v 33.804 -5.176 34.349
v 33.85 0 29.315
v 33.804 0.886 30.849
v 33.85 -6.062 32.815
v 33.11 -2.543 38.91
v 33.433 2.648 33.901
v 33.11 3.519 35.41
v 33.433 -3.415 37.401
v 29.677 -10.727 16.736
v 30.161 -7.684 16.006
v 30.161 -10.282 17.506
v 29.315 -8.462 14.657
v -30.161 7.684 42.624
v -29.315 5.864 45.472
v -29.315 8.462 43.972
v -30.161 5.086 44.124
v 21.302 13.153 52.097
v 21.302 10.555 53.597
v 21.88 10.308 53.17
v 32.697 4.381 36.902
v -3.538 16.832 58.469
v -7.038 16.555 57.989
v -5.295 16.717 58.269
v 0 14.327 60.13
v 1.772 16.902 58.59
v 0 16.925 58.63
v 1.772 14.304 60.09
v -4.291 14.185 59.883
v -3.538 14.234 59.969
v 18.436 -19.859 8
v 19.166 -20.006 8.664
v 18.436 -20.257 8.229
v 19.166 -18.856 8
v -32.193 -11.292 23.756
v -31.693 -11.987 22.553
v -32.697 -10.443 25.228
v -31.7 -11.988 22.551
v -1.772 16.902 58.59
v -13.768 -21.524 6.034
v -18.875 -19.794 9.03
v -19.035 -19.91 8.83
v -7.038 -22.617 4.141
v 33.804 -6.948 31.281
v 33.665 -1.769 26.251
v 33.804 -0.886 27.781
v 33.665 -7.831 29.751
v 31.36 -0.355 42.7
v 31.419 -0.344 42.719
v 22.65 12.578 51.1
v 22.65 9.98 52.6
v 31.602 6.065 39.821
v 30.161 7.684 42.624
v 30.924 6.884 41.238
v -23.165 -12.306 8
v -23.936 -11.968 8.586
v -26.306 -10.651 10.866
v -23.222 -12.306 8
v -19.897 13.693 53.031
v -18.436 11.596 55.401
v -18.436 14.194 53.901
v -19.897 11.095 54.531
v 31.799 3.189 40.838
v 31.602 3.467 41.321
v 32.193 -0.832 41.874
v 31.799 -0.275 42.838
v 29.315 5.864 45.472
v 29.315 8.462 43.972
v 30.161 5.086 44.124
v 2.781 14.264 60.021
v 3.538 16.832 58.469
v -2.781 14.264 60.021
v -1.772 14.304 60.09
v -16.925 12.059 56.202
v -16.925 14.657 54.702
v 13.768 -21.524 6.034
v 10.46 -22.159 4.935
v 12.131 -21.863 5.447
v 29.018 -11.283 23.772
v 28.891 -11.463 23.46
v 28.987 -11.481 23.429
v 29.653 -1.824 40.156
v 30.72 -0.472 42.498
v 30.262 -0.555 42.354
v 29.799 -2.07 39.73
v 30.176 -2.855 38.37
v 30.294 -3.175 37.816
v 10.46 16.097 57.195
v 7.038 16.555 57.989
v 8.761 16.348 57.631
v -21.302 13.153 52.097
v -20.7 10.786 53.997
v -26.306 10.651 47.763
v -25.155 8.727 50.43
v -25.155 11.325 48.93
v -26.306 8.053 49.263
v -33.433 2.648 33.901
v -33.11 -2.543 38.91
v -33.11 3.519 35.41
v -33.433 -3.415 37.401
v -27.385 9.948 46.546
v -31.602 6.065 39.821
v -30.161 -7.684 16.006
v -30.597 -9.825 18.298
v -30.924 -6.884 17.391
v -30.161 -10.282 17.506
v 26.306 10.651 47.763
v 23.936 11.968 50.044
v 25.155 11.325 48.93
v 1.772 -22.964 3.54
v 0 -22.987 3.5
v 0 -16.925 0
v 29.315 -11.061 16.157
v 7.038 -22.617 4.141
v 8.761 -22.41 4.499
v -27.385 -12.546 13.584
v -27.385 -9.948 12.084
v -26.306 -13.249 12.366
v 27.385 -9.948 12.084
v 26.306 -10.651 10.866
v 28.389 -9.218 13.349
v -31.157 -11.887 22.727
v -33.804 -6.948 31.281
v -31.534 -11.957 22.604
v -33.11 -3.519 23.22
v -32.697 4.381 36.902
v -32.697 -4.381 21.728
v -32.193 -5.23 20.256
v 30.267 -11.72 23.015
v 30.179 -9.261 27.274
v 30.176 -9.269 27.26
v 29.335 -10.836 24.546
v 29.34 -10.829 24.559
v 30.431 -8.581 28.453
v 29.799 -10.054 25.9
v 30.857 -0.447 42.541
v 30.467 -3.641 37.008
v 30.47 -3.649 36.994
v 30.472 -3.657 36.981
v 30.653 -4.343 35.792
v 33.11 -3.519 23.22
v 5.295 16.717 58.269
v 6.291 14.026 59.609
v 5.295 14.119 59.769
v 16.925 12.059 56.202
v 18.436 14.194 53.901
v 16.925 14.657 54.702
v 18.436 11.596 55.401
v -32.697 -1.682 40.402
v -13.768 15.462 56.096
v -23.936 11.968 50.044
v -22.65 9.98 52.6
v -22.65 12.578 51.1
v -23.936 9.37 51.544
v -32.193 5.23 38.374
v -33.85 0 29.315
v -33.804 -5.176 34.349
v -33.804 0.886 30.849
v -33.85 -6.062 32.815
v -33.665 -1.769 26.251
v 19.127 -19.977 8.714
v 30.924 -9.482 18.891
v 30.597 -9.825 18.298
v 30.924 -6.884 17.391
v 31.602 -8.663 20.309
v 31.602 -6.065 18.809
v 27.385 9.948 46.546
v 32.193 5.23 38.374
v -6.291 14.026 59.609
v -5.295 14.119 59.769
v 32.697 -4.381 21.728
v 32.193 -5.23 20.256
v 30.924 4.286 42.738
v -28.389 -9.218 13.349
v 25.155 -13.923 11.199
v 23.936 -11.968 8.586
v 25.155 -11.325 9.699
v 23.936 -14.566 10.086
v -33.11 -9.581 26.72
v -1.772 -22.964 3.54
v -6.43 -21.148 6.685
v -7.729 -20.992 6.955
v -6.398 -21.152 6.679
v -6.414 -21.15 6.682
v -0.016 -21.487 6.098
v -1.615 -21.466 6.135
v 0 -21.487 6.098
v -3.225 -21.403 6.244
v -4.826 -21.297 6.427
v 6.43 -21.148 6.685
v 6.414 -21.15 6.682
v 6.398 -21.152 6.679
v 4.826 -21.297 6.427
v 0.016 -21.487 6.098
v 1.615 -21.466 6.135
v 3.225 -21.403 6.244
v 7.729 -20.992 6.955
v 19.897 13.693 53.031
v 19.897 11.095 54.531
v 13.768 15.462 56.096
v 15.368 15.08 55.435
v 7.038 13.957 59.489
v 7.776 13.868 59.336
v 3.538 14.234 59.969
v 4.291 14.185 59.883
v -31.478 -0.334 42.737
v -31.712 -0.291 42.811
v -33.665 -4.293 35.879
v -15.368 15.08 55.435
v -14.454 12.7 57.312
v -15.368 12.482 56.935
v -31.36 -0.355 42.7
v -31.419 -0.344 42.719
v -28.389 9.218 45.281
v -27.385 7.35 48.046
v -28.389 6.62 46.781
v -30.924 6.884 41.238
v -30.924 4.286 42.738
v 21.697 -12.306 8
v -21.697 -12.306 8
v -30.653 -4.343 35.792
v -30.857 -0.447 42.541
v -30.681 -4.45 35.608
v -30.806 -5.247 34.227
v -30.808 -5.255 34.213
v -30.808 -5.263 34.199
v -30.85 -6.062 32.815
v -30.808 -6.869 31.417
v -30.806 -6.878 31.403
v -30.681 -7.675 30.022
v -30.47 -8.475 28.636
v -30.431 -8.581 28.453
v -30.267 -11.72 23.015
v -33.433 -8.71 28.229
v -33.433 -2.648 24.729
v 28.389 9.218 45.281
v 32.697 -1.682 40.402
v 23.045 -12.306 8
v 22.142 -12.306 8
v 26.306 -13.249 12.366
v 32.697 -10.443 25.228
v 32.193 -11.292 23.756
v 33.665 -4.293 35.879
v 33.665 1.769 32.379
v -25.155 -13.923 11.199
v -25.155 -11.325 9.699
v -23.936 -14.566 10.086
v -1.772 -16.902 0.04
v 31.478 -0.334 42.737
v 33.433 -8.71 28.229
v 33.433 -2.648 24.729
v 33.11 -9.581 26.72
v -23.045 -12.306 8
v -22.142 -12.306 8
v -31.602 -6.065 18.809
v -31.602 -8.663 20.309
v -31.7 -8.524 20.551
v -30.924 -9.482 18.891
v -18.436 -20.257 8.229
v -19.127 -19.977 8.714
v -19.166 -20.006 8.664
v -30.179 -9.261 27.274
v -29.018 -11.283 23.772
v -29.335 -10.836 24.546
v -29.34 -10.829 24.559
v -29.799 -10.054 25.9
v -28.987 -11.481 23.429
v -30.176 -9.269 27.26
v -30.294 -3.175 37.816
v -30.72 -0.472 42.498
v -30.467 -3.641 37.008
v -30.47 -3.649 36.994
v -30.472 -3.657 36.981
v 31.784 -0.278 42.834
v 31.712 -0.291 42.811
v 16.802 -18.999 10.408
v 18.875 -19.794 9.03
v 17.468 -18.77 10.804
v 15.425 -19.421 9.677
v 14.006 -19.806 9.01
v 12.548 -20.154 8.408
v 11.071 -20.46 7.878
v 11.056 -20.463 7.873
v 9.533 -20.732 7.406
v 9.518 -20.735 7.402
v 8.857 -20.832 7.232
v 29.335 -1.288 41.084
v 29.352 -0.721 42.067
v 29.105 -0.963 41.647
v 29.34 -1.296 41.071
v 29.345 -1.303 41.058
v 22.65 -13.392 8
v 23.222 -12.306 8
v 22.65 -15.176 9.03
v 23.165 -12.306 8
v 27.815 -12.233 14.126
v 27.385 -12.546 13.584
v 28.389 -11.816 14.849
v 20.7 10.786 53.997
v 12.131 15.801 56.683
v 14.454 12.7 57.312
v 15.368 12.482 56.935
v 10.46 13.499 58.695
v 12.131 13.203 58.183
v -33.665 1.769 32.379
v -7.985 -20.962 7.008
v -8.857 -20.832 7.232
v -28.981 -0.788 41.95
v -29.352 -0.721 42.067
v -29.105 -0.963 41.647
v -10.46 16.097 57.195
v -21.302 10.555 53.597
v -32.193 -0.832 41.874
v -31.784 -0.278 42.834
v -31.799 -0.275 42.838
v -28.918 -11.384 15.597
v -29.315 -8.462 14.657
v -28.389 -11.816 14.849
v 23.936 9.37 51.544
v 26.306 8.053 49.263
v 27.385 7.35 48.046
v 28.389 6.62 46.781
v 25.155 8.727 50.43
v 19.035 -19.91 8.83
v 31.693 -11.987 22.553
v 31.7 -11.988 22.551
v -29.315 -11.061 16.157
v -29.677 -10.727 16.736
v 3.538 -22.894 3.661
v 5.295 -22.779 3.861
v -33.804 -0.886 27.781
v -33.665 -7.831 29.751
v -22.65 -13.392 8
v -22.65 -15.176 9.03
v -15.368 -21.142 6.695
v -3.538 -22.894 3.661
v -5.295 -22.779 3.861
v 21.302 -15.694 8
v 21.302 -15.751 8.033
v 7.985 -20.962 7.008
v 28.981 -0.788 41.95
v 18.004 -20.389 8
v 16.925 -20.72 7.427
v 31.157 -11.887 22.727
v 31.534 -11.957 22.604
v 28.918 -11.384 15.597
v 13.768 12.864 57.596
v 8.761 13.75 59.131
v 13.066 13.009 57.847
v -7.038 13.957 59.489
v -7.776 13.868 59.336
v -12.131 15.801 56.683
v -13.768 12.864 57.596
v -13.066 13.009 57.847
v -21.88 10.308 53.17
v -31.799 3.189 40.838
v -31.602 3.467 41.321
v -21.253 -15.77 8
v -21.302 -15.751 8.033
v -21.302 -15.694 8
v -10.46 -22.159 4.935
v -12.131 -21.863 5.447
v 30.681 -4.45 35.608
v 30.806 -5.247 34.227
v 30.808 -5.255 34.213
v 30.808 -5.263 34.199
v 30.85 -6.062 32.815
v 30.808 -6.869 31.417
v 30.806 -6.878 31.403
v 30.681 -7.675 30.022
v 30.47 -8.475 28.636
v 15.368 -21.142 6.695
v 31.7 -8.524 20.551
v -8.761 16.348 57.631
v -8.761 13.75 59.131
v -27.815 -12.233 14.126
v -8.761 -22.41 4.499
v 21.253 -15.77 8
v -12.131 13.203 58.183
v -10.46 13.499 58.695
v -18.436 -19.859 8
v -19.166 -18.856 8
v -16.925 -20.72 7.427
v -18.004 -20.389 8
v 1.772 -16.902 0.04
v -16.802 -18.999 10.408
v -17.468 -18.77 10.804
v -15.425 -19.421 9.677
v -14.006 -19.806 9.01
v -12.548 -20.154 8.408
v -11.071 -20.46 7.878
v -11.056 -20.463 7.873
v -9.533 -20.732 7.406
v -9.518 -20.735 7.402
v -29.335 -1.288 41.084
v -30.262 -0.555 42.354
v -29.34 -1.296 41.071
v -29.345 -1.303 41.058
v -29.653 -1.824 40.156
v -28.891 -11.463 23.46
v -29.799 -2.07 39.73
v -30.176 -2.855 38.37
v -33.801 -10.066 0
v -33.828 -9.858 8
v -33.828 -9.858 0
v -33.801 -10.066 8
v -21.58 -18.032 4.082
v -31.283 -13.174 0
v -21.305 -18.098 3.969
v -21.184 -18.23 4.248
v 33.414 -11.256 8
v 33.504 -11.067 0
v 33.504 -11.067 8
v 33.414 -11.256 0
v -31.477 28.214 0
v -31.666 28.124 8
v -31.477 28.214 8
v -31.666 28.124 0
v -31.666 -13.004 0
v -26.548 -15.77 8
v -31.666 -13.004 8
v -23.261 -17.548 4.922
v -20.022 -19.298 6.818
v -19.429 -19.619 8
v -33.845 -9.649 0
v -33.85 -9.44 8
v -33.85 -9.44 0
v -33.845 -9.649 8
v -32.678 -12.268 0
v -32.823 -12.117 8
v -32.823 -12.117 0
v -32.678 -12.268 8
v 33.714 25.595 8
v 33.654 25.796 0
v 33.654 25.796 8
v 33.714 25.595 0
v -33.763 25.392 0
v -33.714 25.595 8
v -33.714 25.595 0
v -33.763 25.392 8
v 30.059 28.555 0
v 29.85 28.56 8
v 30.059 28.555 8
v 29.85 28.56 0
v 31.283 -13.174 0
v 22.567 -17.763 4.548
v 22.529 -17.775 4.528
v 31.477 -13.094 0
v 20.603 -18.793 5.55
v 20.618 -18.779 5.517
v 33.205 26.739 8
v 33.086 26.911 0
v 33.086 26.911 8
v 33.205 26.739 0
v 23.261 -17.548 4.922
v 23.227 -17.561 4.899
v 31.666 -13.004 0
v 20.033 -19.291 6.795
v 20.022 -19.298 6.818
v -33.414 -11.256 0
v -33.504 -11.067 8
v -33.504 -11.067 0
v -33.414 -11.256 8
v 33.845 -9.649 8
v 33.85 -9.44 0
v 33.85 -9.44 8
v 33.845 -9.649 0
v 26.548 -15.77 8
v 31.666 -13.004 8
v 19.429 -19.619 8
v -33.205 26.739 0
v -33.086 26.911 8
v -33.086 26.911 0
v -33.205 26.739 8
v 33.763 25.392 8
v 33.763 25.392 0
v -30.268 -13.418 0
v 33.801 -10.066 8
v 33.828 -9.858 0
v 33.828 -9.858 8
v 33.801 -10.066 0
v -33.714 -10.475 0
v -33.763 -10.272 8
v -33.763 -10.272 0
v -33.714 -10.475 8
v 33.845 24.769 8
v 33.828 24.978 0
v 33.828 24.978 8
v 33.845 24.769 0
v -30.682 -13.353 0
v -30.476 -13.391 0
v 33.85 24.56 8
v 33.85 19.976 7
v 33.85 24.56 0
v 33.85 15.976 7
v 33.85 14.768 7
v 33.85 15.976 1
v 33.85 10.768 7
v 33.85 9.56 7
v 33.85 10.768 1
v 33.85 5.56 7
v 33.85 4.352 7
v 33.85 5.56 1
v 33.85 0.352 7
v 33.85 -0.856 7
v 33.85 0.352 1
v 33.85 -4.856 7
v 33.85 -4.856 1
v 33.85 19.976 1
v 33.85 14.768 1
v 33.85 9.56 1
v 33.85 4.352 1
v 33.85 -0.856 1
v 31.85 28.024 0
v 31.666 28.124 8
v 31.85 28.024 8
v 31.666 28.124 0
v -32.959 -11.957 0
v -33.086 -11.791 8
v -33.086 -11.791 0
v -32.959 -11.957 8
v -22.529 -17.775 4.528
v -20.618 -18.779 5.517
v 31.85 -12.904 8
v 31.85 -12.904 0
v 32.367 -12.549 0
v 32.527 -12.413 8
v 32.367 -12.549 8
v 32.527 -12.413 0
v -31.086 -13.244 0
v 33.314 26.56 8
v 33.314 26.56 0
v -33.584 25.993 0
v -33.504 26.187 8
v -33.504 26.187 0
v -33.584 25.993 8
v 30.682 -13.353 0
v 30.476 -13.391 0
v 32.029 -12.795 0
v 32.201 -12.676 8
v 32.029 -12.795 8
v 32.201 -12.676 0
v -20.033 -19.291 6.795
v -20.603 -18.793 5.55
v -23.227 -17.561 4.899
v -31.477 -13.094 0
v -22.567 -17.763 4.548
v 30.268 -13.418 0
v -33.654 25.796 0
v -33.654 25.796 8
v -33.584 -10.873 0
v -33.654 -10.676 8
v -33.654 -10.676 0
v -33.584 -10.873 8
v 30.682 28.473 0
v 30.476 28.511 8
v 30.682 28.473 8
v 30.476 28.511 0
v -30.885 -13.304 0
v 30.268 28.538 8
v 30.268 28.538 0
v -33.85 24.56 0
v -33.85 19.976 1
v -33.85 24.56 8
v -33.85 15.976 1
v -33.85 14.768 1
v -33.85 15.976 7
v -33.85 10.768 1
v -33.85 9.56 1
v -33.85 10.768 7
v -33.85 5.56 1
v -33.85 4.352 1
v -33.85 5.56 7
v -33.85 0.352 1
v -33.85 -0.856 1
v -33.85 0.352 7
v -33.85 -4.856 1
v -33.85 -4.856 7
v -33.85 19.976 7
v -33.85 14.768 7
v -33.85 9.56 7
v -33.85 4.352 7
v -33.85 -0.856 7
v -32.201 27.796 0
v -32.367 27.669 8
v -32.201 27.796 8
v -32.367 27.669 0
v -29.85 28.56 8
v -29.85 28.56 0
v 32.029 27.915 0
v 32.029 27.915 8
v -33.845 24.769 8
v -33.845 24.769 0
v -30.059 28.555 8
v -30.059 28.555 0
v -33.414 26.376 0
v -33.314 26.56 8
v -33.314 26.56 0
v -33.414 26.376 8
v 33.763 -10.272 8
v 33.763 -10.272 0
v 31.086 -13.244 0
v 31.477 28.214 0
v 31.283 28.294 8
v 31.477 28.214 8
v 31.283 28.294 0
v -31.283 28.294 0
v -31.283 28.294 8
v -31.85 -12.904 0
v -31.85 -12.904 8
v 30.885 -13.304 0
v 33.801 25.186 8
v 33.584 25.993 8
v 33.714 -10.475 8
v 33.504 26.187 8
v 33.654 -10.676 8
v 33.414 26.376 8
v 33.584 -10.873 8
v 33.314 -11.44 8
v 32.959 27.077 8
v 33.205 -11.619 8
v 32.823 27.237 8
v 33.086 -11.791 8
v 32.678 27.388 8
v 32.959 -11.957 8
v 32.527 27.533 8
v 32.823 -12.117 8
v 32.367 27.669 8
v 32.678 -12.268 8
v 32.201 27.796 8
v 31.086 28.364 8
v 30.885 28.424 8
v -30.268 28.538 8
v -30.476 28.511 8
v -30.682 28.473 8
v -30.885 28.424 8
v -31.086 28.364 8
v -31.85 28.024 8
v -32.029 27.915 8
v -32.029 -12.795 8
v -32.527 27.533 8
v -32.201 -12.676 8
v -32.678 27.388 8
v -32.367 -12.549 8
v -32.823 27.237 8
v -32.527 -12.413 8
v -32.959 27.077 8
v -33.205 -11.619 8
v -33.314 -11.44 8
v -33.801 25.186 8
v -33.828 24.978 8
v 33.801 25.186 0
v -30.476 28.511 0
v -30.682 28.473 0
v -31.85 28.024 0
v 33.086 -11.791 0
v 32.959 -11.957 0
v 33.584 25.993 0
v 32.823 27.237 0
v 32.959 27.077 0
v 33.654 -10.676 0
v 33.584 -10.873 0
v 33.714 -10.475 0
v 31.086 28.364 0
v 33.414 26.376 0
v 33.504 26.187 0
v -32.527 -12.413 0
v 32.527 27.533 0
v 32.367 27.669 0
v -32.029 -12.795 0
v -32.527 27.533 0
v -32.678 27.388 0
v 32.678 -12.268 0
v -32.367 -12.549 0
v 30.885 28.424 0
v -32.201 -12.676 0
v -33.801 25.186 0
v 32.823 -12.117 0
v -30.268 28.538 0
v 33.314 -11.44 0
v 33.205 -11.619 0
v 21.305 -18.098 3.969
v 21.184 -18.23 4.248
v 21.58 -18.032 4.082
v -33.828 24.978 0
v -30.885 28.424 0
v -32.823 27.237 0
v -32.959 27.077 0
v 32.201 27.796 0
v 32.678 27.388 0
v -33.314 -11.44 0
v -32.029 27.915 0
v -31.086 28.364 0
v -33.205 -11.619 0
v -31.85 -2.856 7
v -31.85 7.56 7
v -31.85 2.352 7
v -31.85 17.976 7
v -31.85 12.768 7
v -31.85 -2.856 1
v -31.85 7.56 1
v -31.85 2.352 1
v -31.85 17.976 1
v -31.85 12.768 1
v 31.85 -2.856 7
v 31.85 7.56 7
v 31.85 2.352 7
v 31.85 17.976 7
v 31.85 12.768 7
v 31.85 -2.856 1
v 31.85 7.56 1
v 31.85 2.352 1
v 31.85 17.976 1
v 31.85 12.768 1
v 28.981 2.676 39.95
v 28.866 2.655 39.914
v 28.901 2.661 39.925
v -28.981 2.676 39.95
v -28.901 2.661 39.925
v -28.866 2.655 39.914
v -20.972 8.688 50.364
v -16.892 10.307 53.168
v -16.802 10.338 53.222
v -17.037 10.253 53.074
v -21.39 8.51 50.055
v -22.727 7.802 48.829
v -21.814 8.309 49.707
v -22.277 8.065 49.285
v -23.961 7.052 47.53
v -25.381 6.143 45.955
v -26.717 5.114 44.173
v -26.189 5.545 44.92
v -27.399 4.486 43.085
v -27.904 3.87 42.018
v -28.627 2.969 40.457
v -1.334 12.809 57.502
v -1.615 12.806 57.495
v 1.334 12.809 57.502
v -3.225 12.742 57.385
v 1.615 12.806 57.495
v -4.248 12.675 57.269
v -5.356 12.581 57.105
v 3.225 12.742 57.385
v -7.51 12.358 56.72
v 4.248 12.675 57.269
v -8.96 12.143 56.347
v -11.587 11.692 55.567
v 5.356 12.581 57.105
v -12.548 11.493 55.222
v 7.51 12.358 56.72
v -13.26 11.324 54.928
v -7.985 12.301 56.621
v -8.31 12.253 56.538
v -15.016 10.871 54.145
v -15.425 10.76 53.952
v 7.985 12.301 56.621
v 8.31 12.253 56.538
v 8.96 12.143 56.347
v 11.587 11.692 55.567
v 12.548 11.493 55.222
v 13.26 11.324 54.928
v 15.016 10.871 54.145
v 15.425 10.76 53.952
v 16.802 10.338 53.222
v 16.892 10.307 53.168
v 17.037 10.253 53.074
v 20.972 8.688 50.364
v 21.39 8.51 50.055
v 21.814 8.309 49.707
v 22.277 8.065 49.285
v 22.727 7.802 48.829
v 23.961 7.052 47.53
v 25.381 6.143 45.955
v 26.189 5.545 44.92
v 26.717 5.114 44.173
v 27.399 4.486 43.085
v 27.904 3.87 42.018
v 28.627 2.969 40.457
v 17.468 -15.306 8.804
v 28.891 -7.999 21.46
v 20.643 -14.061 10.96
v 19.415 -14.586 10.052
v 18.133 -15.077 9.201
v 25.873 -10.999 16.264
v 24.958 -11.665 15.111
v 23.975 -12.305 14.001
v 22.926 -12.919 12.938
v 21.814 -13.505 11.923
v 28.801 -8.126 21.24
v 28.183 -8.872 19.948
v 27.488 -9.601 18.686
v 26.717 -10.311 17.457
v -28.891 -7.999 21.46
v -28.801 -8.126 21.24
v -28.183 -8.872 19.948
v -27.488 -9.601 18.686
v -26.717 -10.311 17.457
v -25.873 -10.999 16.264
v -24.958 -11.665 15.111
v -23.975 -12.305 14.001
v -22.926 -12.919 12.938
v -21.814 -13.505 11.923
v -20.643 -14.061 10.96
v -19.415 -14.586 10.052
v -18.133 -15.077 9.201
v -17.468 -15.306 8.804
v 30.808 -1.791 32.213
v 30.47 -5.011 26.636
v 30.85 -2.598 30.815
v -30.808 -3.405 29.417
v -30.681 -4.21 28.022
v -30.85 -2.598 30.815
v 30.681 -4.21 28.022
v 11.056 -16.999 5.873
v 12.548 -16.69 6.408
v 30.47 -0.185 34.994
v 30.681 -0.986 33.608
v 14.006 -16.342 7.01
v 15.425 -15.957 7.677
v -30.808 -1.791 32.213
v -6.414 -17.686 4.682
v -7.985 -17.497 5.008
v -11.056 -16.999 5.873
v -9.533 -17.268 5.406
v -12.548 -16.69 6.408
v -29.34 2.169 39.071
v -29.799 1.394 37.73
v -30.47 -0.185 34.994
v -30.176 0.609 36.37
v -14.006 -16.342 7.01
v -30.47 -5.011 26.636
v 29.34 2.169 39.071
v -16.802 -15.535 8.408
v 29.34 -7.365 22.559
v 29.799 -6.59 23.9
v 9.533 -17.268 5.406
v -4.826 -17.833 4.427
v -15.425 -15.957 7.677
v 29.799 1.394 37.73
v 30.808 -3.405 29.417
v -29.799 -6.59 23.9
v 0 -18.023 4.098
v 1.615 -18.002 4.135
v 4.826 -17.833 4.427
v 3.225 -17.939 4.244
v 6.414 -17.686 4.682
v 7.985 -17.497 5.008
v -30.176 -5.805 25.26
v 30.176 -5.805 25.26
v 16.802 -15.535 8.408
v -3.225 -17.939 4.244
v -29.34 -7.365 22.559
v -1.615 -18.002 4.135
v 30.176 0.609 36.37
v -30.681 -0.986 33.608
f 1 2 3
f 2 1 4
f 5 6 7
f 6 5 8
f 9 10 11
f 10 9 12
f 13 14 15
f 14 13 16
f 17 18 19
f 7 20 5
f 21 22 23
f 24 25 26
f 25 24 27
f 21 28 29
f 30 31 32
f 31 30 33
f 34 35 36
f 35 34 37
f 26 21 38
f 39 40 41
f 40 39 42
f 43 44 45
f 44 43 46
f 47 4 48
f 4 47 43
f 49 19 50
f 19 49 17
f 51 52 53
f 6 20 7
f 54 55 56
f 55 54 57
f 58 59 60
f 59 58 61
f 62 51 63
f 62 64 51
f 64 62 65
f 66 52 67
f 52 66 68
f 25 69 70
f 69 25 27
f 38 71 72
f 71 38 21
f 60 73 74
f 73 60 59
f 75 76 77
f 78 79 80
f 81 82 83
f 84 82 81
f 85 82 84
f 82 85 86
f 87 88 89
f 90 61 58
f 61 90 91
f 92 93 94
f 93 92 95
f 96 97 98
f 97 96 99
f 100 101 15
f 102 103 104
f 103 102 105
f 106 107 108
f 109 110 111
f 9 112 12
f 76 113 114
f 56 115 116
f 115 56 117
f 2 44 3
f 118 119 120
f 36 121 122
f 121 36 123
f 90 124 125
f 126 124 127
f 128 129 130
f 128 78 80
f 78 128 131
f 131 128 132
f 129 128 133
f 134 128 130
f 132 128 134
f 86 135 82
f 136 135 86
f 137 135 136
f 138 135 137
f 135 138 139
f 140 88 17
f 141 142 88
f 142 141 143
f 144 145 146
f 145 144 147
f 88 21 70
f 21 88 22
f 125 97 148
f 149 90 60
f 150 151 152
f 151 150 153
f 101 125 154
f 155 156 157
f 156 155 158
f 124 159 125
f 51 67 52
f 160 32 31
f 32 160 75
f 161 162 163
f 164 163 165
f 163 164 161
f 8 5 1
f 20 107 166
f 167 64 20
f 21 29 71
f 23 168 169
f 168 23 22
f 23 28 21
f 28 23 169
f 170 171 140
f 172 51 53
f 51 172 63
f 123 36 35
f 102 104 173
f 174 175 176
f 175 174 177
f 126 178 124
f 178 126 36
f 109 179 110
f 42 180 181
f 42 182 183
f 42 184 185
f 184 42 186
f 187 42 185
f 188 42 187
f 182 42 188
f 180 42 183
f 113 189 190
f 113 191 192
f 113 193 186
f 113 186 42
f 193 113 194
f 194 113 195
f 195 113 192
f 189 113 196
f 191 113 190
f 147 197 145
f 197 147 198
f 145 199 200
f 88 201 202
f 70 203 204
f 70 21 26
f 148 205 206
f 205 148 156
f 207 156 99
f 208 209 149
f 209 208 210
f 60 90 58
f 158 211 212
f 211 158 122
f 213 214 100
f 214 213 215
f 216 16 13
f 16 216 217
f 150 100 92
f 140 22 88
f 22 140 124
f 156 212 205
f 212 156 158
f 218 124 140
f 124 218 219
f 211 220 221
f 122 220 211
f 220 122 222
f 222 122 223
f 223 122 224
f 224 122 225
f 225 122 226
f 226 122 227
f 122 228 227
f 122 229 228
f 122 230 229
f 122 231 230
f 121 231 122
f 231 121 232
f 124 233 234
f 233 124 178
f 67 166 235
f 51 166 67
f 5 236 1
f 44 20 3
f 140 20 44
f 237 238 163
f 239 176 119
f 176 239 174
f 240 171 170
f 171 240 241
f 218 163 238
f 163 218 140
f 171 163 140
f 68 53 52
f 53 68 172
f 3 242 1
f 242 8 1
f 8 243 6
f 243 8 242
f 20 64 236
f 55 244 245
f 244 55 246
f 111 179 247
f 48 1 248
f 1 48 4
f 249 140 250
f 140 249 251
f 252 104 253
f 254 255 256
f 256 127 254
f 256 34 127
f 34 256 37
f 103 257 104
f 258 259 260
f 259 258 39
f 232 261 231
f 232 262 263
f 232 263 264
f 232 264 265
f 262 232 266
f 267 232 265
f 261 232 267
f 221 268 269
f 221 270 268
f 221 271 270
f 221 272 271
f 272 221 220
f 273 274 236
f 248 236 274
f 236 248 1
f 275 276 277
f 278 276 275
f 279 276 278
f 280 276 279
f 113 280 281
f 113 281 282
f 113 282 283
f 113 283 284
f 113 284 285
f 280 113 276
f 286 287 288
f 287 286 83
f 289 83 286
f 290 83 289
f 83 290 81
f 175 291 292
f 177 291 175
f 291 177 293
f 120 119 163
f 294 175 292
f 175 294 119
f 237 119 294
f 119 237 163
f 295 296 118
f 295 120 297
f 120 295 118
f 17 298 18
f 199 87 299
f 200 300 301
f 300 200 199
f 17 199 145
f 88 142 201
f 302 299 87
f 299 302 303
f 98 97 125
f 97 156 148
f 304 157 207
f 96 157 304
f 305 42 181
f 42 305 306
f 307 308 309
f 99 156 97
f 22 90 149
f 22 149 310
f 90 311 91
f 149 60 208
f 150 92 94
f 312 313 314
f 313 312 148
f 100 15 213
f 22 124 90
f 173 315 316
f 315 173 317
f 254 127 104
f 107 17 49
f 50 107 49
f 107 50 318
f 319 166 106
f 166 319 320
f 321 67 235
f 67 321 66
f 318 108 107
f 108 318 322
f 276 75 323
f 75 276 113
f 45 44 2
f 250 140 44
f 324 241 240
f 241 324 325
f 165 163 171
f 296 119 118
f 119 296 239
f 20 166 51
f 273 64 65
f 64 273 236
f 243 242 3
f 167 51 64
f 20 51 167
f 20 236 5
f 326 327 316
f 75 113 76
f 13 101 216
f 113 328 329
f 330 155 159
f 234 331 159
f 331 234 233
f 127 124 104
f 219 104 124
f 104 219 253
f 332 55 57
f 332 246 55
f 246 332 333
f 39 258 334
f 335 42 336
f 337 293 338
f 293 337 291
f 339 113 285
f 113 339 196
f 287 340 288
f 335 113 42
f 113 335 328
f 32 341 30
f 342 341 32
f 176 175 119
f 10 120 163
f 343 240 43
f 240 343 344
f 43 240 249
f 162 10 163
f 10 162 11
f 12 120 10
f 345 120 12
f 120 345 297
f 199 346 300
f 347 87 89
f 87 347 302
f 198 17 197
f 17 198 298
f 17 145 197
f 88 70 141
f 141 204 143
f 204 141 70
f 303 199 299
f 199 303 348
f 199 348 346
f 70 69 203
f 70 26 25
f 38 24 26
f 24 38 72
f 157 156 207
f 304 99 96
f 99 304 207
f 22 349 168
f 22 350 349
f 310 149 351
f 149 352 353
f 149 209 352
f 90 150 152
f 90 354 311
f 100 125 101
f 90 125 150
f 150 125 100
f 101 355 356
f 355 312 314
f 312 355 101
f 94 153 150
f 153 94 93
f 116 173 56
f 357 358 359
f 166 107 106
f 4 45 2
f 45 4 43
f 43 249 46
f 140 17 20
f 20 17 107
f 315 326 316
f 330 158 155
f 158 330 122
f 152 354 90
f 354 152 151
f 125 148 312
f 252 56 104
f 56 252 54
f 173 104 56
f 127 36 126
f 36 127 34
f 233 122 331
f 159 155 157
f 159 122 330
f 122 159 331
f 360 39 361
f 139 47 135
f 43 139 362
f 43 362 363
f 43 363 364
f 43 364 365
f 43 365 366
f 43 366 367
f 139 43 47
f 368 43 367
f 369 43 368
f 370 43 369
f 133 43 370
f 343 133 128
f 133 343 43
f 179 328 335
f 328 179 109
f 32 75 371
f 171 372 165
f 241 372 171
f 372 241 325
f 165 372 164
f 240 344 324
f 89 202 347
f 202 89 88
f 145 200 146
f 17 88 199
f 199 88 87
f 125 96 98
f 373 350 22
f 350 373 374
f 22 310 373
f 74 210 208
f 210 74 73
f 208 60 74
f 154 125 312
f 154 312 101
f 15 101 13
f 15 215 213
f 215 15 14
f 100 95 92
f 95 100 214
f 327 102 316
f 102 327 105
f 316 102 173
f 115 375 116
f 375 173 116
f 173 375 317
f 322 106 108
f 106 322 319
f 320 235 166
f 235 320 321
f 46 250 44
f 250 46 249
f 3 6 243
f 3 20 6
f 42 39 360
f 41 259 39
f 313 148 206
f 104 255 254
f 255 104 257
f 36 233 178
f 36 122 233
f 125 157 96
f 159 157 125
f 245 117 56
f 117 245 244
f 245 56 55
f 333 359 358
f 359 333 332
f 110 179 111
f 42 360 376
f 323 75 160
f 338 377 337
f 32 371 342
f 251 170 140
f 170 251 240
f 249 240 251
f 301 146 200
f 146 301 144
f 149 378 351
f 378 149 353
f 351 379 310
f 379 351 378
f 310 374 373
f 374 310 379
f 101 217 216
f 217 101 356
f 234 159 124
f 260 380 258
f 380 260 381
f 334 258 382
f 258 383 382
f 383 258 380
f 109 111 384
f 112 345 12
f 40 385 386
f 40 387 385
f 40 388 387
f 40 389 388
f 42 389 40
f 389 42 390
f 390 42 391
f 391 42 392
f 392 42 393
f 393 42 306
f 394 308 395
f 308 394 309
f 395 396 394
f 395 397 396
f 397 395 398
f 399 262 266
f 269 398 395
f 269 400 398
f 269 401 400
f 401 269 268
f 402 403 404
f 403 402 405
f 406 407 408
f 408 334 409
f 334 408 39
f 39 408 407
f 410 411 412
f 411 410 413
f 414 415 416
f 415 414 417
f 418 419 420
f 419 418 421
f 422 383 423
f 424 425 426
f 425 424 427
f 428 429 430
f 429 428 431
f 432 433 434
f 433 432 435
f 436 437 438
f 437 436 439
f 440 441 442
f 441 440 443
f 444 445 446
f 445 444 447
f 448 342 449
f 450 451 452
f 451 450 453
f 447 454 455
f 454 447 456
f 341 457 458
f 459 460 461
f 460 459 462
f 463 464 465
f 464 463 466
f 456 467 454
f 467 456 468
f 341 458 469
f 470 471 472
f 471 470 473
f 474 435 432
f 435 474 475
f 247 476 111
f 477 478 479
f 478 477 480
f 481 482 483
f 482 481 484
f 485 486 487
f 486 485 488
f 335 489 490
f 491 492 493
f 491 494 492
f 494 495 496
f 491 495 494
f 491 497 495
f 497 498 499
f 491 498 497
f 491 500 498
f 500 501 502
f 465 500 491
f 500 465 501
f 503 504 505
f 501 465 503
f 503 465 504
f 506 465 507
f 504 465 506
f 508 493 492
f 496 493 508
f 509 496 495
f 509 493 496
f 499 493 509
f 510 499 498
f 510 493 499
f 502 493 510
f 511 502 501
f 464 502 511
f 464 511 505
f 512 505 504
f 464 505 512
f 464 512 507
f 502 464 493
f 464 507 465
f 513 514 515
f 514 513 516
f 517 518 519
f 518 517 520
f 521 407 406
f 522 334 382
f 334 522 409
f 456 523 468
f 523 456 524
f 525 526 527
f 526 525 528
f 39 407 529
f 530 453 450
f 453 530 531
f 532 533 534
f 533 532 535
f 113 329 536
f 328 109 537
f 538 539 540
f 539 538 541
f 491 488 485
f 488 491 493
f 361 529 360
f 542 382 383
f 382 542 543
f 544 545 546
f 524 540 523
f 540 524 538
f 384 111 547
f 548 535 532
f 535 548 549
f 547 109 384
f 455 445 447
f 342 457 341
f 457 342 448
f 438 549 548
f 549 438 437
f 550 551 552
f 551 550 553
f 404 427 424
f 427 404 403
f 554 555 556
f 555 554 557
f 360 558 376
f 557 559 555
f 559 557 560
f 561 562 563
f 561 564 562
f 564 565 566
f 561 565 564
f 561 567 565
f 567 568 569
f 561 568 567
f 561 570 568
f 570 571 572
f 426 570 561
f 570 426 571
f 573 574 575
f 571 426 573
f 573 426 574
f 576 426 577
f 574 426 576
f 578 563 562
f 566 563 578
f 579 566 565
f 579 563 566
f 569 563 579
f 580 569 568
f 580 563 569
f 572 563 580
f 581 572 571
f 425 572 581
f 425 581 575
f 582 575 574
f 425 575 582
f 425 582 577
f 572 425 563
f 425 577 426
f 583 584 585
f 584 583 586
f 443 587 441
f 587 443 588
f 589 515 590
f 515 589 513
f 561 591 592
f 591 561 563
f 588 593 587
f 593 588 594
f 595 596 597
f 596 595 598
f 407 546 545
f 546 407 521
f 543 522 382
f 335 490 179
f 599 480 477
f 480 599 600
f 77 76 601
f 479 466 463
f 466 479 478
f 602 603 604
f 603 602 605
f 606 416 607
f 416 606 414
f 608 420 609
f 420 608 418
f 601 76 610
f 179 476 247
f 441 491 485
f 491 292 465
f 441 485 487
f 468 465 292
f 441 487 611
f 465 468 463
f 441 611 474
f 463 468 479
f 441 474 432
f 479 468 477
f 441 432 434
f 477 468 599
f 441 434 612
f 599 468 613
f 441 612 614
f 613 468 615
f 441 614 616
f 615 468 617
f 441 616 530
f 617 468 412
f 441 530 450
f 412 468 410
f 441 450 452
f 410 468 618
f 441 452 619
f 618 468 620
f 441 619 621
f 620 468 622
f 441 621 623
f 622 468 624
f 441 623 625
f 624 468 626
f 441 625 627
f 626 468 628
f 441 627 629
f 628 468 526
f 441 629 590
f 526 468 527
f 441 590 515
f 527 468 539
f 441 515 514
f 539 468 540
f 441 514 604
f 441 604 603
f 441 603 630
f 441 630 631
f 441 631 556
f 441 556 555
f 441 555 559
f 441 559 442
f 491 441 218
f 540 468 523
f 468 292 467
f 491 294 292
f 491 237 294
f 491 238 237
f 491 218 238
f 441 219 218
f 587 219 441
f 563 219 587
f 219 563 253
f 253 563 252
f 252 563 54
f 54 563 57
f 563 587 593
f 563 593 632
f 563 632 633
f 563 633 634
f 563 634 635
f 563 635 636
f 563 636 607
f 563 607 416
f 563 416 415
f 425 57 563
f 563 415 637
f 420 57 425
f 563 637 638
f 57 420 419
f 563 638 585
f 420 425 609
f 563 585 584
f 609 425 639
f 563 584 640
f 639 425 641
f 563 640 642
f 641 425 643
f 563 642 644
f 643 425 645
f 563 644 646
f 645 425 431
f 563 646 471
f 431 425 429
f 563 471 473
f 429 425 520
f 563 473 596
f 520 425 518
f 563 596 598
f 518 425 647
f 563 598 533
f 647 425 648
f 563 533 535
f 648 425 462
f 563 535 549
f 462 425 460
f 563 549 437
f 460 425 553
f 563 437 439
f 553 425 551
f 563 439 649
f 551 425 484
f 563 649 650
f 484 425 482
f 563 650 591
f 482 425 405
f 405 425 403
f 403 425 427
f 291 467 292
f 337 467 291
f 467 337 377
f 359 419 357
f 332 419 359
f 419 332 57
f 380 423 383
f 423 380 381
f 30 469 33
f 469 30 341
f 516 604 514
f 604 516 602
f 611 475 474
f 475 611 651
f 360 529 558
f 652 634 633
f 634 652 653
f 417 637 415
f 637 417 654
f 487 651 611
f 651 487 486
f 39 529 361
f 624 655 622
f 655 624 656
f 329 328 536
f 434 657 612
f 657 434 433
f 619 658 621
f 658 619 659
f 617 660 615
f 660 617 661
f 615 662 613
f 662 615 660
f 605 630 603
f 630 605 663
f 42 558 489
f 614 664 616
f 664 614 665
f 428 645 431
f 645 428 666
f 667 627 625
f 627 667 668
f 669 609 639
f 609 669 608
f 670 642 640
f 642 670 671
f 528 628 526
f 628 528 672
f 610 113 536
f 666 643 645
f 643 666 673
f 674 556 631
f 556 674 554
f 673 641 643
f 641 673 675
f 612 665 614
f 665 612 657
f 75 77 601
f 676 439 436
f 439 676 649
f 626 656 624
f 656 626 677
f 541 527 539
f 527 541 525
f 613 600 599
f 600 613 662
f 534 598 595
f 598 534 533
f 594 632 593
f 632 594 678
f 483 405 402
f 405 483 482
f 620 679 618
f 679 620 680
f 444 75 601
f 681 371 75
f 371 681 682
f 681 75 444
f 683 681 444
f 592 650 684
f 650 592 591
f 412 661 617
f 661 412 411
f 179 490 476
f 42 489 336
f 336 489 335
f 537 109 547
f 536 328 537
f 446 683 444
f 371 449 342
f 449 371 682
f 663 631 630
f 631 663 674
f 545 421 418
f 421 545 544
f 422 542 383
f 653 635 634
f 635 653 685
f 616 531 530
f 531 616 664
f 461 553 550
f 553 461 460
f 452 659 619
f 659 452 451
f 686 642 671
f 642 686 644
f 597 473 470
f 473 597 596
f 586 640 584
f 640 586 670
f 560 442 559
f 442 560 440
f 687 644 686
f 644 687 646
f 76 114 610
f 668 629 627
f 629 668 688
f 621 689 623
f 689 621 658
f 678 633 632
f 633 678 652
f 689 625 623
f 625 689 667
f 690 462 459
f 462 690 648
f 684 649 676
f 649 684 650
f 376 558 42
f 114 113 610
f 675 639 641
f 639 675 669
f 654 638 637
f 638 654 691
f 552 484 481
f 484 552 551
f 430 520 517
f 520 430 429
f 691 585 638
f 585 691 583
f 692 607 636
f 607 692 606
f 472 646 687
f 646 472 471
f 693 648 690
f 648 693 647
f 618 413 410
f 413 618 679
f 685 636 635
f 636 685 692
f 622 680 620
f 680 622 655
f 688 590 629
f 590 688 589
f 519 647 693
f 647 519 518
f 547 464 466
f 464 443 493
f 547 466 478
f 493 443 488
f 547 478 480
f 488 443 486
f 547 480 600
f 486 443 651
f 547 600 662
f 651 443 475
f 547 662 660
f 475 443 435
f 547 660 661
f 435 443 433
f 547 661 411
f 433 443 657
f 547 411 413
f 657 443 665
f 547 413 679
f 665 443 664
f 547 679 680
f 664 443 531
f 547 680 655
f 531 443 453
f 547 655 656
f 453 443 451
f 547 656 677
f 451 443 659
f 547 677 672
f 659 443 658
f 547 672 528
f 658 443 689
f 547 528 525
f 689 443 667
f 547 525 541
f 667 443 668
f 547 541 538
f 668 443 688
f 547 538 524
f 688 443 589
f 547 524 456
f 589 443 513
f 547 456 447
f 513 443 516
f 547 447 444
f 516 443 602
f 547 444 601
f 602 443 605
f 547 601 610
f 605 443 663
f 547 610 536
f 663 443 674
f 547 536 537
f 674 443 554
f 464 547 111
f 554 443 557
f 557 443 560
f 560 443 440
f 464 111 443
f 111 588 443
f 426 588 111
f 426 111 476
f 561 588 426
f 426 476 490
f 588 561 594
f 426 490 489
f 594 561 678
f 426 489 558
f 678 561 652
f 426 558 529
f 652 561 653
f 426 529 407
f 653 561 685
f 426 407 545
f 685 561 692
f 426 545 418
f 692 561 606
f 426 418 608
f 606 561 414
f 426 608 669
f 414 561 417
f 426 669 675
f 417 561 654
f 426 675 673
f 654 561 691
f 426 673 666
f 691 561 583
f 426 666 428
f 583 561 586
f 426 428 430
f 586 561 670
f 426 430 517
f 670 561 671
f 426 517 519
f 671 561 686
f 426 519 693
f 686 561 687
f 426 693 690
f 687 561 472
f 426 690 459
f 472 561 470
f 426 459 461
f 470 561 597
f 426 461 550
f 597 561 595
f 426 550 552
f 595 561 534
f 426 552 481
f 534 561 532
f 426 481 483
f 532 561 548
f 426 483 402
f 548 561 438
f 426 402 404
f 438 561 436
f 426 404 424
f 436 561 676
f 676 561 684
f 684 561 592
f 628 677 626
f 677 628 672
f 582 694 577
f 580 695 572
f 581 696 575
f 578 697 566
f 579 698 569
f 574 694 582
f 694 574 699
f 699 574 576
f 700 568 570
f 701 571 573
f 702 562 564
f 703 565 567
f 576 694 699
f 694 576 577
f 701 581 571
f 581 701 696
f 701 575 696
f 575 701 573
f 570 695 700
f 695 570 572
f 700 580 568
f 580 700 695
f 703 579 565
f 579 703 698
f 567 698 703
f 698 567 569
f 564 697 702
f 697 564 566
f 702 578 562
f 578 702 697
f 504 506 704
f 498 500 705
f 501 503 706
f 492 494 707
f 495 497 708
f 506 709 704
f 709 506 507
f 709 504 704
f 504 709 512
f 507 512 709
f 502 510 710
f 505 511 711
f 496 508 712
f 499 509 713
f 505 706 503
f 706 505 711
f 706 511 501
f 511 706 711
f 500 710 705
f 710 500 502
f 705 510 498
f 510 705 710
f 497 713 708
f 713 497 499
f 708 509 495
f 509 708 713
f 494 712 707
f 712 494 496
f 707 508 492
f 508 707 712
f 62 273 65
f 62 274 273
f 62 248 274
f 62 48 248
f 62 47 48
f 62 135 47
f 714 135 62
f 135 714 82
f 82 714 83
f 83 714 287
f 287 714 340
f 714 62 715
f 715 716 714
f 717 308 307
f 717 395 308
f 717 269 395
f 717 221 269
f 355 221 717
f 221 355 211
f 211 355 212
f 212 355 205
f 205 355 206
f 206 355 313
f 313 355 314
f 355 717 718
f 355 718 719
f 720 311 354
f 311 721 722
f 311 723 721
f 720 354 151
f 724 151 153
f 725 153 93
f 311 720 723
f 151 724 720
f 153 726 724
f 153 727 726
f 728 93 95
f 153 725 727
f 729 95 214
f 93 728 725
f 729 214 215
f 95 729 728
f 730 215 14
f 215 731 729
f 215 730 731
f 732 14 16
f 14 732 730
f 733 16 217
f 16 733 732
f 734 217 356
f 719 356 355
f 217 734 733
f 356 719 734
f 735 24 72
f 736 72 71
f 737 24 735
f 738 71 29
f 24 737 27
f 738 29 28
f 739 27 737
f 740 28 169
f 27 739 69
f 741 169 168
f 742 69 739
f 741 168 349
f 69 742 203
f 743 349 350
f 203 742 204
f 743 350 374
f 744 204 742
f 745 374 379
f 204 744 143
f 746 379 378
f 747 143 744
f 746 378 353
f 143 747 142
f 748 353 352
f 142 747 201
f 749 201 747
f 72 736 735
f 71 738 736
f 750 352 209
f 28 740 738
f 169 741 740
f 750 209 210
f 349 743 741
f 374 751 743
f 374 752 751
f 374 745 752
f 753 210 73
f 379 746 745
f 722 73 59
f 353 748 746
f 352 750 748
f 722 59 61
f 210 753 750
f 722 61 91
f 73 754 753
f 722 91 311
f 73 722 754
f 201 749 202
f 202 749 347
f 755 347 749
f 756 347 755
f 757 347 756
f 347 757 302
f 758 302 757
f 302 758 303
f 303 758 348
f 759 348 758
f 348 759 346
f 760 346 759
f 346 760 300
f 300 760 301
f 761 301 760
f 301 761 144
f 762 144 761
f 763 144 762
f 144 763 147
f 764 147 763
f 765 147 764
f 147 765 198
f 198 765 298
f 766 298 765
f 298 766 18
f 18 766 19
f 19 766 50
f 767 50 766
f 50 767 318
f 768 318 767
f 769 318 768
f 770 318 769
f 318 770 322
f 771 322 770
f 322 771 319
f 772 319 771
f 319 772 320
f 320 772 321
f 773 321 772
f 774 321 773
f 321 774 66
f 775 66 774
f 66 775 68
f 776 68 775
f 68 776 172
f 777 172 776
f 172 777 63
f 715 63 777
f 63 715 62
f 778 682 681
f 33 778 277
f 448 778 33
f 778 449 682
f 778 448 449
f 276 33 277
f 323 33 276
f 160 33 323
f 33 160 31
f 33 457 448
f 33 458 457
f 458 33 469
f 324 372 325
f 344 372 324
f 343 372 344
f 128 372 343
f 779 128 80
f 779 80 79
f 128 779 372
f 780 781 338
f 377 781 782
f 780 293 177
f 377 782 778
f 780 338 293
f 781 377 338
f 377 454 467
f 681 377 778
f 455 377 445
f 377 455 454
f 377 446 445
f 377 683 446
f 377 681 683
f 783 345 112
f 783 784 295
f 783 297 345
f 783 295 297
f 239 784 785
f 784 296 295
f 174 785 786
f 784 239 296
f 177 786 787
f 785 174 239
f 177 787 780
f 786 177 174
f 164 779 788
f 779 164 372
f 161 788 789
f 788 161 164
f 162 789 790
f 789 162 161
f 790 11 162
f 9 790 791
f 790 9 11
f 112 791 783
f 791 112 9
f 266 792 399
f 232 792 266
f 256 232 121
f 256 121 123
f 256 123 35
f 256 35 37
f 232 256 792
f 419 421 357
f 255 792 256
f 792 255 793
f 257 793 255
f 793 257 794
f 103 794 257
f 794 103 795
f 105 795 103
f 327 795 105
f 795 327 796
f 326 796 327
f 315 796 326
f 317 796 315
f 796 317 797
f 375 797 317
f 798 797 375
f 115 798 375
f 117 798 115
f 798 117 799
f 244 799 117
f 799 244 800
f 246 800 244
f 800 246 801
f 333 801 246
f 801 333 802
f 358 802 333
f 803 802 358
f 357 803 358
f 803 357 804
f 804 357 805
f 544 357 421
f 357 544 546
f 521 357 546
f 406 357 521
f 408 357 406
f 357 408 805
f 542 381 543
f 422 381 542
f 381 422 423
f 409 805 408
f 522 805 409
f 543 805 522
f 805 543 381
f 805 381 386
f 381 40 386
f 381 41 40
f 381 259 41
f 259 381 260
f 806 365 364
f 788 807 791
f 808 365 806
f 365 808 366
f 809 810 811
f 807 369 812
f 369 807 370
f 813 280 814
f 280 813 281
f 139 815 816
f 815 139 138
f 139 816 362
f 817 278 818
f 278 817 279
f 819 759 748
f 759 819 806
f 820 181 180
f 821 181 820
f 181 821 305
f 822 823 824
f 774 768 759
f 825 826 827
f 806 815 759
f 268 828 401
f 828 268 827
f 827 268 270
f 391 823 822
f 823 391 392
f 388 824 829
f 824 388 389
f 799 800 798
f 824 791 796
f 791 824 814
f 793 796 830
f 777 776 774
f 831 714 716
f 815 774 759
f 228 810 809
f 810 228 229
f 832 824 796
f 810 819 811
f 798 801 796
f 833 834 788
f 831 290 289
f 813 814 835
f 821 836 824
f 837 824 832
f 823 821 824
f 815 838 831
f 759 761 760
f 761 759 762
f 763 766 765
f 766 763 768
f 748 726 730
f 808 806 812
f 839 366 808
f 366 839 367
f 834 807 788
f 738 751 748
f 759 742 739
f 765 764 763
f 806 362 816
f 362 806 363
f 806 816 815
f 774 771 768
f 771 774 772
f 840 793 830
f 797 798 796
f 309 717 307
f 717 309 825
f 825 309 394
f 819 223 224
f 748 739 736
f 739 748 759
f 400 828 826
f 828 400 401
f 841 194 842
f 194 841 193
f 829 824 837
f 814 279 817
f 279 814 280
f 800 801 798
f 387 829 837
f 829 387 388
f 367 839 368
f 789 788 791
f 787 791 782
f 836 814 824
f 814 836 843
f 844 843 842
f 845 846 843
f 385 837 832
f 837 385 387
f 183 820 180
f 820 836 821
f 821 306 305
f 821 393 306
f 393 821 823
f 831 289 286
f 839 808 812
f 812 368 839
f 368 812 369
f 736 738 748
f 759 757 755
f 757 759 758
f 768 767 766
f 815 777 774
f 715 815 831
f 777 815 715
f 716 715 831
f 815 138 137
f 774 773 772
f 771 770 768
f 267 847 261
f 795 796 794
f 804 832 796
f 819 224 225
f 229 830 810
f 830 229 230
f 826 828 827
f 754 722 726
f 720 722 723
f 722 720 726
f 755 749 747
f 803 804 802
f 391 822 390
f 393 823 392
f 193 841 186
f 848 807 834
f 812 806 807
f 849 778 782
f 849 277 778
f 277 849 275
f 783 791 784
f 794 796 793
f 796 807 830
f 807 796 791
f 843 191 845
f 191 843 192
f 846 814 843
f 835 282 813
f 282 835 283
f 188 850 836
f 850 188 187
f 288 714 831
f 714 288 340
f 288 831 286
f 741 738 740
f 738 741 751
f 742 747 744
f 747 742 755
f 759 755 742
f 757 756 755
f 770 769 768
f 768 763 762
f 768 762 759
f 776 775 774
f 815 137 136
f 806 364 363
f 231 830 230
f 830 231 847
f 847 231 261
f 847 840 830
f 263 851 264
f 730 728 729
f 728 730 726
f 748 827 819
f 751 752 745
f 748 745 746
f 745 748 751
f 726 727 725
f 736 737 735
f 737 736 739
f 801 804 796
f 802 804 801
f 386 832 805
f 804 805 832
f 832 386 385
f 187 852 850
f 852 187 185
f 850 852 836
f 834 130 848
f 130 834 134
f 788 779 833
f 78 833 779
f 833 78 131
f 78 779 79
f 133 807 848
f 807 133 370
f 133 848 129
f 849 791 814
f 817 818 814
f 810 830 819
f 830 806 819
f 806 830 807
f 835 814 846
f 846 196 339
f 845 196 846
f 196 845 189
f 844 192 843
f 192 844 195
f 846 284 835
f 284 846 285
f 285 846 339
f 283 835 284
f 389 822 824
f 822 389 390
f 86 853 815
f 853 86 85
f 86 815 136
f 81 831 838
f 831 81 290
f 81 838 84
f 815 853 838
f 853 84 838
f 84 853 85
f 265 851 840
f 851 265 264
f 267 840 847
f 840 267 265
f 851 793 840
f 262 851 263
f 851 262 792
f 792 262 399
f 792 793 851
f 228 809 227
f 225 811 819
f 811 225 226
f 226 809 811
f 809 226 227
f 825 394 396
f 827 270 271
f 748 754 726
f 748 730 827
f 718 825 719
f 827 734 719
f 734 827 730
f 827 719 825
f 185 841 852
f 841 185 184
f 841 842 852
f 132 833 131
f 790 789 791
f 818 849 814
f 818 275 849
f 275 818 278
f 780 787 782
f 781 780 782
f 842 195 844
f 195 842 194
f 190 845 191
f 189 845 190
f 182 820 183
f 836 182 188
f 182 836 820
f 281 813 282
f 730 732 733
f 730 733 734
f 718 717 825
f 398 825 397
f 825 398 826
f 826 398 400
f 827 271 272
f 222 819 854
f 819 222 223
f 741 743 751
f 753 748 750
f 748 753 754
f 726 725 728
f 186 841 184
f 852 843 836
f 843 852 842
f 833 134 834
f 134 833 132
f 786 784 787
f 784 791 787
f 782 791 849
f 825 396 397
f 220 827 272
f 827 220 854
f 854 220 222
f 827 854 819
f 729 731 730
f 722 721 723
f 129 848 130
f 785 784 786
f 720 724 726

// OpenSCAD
// Beyblade X 計分器 —— 傾斜桌面立座
//
// 承接對象是「含現成鋁殼的完整本體」，不是裸 PCB，所以不需要對 PCB 孔位，
// 只需要一個直徑與厚度都對得上的圓形凹槽。
//
// 匯出 STL：
//   openscad -o stand.stl cad/stand.scad
//   openscad -o test_ring.stl -D 'mode="test_ring"' cad/stand.scad
//
// 建議流程：先印 test_ring（薄片，約十分鐘）確認 Ø 配合鬆緊，再印完整立座。

/* [模式] */
// "stand" = 完整立座；"test_ring" = 只印承接環，用來驗證直徑配合
mode = "stand";

/* [實測值 —— 改這裡] */
// 含鋁殼本體的外徑。圓形物體用游標卡尺要轉幾個角度取最大值，量到弦會偏小。
body_dia = 61.0;
// 含鋁殼本體的厚度
body_thick = 11.0;

/* [配合公差] */
// 單邊間隙。FDM 建議 0.3~0.4；太緊塞不進、太鬆會晃。
// 實際凹槽直徑 = body_dia + 2 * fit_clearance
fit_clearance = 0.35;

/* [姿態] */
// 後仰角（度）。0 = 螢幕完全直立，30 = 向後仰 30 度。
lean_back = 30;

/* [結構] */
recess_depth = 4.0;   // 本體嵌入深度。露出 body_thick - recess_depth
floor_t      = 3.0;   // 背板厚度
wall         = 3.0;   // 承接環外壁厚
foot_depth   = 42.0;  // 底座前後深度。後仰越多要越深，否則會後翻。
base_t       = 8.0;   // 底板厚度。要夠高才容得下前緣的棘齒紋
vent_dia     = 0;     // 背板中央開孔直徑；0 = 不開

/* [外壁開口] */
// "arcs" = 只保留三段支撐弧，上半部全開（安全預設：鋁殼側面的
//          PWR / BOOT / USB-C 角向位置未實測，整圈壁可能壓到按鈕）
// "full" = 完整外圈，再依 port_cuts 逐一開槽（量完角度後改用這個）
rim_mode = "arcs";

// 角度慣例：0 = 螢幕正上方（12 點鐘），順時針為正。
// [中心角度, 開口跨度]
arc_gaps = [
    [   0, 140],  // 上半部全開，取放也方便
    [ 128,  35],  // 右側
    [ 232,  35],  // 左側
];

// rim_mode = "full" 時使用。角度是待實測的佔位值，不要直接照印。
port_cuts = [
    [ 180, 22],  // USB-C
    [ 135, 16],  // PWR
    [ 225, 16],  // BOOT / RESET
];

/* [棘齒紋] */
// 底座前緣下方切一排 V 形槽，取 Beyblade 棘輪的意象。
// 刻意用「切」而不是「加」—— 凸出來的齒 FDM 要架支撐，切進去的槽不用，
// 而且不影響底座強度分布。
ratchet = true;
ratchet_count = 5;    // 每側齒數。齒間留壁要 >1mm，太密印不出來
ratchet_depth = 2.0;  // 切入深度
ratchet_h = 6.0;      // 齒紋帶高度，必須小於 base_t
// 方柱中心要放在側面平面「外側」這麼多。中心剛好落在平面上的話，方柱的角
// 會與表面零厚度接觸，切出來的 STL 帶一堆非流形邊。
ratchet_out = 1.0;

/* [其他] */
$fn = 120;

// ---------------------------------------------------------------- 推導值

recess_dia = body_dia + 2 * fit_clearance;
outer_dia  = recess_dia + 2 * wall;
plate_h    = floor_t + recess_depth;

// 承接環繞 X 軸旋轉的角度：90 = 完全直立
tilt = 90 - lean_back;

// 旋轉後把整體抬到剛好接觸 z = 0
lift = (outer_dia / 2) * sin(tilt);

// 底座往後偏移，讓支撐面涵蓋後仰造成的重心位移
foot_offset_y = foot_depth * 0.18;

// hull 到底板時只取承接環最下面這一段，避免凸包吃掉整個造型
foot_blend_h = 8.0;

big = 400;  // 「夠大」的切除體尺寸

// ---------------------------------------------------------------- 基本元件

// 扇形柱體，用來切外壁開口。a_mid 為中心角度（12 點鐘起算，順時針）。
module pie(a_mid, span, r, h) {
    // 轉成 OpenSCAD 極角：0 度在 +X，逆時針為正
    p0 = 90 - a_mid - span / 2;
    seg = max(8, ceil(span / 5));
    linear_extrude(h)
        polygon(concat(
            [[0, 0]],
            [for (i = [0 : seg]) let (a = p0 + span * i / seg)
                [r * cos(a), r * sin(a)]]
        ));
}

// 承接環的局部座標：XY 平面，+Z 為螢幕朝向，+Y 為裝好後的上方
module disc_solid() {
    cylinder(h = plate_h, d = outer_dia);
}

// 凹槽往 +Z 延伸得夠遠，確保本體放入的路徑不會被底座材料擋住
module recess_cut() {
    translate([0, 0, floor_t]) cylinder(h = big, d = recess_dia);
}

module vent_cut() {
    if (vent_dia > 0)
        translate([0, 0, -1]) cylinder(h = floor_t + 2, d = vent_dia);
}

module gap_cuts() {
    gaps = (rim_mode == "full") ? port_cuts : arc_gaps;
    for (g = gaps)
        translate([0, 0, floor_t])
            pie(g[0], g[1], outer_dia, recess_depth + 1);
}

// ---------------------------------------------------------------- 擺位

module placed() {
    translate([0, 0, lift]) rotate([tilt, 0, 0]) children();
}

// ---------------------------------------------------------------- 立座

module foot() {
    hull() {
        // 接地的底板
        translate([0, foot_offset_y, 0])
            linear_extrude(base_t)
                offset(r = 4)
                    square([outer_dia - 8, foot_depth - 8], center = true);

        // 承接環最下面一段
        intersection() {
            placed() disc_solid();
            translate([-big / 2, -big / 2, 0]) cube([big, big, foot_blend_h]);
        }
    }
}

// 底座左右側面的 V 形槽。用旋轉 45 度的方柱去切，對角線朝側面，
// 切出來就是等腰三角形的槽口。
//
// 刻意放側面而不是前緣：底板半寬與承接環半徑都是 outer_dia/2，hull 出來的
// 側面是垂直平面，位置不隨高度變，方柱中心擺在平面上就一定是「從外面切進
// 去」。前緣則因為 hull 會往前延伸，固定的 y 會整個埋進材料裡，切出來的是
// 內部空腔而不是槽 —— 那種 STL 是多殼非流形，切片軟體會出錯。
module ratchet_cuts() {
    span = foot_depth * 0.62;
    step = span / ratchet_count;
    // 中心外推 ratchet_out，對角線同步加大，最深處仍切入 ratchet_depth
    edge = (ratchet_depth + ratchet_out) * 1.414;
    for (side = [-1, 1]) {
        for (i = [0 : ratchet_count - 1]) {
            translate([side * (outer_dia / 2 + ratchet_out),
                       foot_offset_y - span / 2 + step * (i + 0.5),
                       1.0 + ratchet_h / 2])
                rotate([0, 0, 45])
                    cube([edge, edge, ratchet_h], center = true);
        }
    }
}

module stand() {
    difference() {
        union() {
            placed() disc_solid();
            foot();
        }
        if (ratchet) ratchet_cuts();
        // 這三個切除放在最外層，foot 的凸包填進凹槽的部分才會一併挖掉
        placed() recess_cut();
        placed() vent_cut();
        placed() gap_cuts();
    }
}

// 驗證片：只有承接環，用來確認直徑配合鬆緊
module test_ring() {
    difference() {
        disc_solid();
        recess_cut();
        vent_cut();
        gap_cuts();
    }
}

// ---------------------------------------------------------------- 輸出

if (mode == "test_ring") test_ring();
else                     stand();
